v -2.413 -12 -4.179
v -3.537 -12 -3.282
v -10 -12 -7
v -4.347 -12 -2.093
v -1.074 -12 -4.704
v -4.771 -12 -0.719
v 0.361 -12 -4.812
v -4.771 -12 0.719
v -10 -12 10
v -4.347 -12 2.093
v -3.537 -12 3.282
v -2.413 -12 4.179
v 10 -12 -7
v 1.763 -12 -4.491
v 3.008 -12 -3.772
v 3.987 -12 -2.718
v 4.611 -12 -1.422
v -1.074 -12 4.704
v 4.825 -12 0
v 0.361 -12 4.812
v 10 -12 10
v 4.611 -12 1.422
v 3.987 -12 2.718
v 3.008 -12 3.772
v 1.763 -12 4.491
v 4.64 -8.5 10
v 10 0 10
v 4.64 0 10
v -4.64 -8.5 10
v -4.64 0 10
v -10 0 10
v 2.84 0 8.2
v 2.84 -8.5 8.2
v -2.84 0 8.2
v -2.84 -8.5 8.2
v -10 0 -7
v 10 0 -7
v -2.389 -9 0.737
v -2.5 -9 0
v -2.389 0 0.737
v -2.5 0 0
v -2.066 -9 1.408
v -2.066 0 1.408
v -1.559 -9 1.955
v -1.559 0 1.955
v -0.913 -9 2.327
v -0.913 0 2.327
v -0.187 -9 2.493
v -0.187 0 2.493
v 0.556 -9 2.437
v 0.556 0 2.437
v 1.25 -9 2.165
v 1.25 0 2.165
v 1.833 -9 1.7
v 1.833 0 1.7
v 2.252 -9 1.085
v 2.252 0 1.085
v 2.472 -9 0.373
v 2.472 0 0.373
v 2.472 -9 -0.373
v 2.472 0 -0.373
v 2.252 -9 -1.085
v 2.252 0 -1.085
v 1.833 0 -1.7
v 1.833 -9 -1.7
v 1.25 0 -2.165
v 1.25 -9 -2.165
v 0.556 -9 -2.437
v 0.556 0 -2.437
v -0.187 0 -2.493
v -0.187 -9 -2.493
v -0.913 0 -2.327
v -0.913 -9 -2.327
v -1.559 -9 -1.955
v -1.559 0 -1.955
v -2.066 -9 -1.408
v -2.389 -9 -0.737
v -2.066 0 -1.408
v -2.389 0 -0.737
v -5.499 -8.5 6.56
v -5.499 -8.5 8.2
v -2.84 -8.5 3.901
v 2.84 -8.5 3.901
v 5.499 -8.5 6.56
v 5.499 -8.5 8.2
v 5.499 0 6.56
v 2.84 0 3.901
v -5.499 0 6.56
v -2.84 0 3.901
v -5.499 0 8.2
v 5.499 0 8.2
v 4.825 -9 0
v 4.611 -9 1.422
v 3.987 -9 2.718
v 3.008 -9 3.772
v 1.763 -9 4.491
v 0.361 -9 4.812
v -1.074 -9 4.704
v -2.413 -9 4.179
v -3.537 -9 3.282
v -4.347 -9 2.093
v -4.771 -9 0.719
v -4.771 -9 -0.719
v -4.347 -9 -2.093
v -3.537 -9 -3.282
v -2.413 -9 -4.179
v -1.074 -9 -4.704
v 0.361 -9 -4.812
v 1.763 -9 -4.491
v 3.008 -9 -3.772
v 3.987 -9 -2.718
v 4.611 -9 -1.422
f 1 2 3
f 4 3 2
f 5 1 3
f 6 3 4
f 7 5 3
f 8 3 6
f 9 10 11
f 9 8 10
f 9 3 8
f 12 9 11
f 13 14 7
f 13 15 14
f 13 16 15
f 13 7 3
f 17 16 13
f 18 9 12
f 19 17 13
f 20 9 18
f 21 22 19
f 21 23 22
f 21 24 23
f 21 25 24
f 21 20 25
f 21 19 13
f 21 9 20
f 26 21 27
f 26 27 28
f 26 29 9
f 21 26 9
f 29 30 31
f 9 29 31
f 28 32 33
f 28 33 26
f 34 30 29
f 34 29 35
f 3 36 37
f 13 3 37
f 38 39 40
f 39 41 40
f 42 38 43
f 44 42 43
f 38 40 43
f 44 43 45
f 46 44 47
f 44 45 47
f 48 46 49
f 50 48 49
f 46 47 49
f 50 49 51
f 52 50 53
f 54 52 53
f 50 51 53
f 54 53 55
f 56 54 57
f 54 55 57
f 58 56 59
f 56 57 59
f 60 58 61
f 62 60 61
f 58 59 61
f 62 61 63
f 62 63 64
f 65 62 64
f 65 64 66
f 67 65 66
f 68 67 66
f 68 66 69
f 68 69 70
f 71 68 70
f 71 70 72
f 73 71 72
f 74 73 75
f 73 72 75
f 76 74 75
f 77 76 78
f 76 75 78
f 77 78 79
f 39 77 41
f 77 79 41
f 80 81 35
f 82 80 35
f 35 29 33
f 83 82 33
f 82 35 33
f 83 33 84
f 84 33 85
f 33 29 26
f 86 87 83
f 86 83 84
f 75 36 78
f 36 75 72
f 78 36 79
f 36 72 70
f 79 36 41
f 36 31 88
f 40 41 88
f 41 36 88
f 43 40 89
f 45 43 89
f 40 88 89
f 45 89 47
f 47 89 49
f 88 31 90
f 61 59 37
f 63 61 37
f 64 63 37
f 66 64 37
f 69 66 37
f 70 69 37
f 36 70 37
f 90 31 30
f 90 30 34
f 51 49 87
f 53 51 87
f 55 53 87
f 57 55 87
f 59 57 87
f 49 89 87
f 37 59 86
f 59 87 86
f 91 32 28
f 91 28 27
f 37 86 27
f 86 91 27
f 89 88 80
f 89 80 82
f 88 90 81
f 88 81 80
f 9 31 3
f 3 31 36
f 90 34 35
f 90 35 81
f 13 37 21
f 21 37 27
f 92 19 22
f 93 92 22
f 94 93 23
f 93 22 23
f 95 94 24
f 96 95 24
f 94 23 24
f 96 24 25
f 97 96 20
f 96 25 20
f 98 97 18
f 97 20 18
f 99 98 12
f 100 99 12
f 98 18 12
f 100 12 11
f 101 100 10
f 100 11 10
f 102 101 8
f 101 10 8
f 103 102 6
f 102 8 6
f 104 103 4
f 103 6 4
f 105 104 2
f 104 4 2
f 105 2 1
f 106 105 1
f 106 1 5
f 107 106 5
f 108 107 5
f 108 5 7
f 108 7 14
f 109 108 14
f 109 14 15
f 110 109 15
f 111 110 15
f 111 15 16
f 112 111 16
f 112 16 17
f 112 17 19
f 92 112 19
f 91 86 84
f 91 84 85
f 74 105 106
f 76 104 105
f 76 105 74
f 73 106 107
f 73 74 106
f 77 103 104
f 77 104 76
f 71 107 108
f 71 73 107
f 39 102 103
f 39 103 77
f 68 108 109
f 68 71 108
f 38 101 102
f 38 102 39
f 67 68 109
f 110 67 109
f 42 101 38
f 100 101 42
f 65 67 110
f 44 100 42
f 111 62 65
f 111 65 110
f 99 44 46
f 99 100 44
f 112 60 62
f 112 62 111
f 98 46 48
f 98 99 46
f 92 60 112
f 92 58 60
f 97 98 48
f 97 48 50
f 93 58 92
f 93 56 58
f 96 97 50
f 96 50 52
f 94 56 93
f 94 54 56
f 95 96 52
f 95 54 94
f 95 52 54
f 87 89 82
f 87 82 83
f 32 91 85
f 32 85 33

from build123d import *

# Parameters (mm, degrees)
F1_DEPTH       = 12
F2_DEPTH       = 8.5
F4_D           = 5
F4_CBORE_D     = 9.65
F4_CBORE_DEPTH = 3


with BuildPart() as f1:
    # F0 (on Front) → F1 (new body)
    with BuildSketch(Plane.XZ):
        Polygon((-10, 10), (-10, -7), (10, -7), (10, 10), (4.64, 10), (2.84, 8.2), (5.49934, 8.2), (5.49934, 6.56), (2.84, 3.90066), (-2.84, 3.90066), (-5.49934, 6.56), (-5.49934, 8.2), (-2.84, 8.2), (-4.64, 10), align=None)
        Polygon((4.64, 10), (-4.64, 10), (-2.84, 8.2), (-5.49934, 8.2), (-5.49934, 6.56), (-2.84, 3.90066), (2.84, 3.90066), (5.49934, 6.56), (5.49934, 8.2), (2.84, 8.2), align=None)
    extrude(amount=F1_DEPTH)

    # F0 (on Front) → F2 (cut)
    with BuildSketch(Plane.XZ):
        Polygon((4.64, 10), (-4.64, 10), (-2.84, 8.2), (-5.49934, 8.2), (-5.49934, 6.56), (-2.84, 3.90066), (2.84, 3.90066), (5.49934, 6.56), (5.49934, 8.2), (2.84, 8.2), align=None)
    extrude(amount=F2_DEPTH, mode=Mode.SUBTRACT)

    # F4 (through all)
    with Locations(Plane.XZ.offset(12)):
        with Locations((0, 0)):
            CounterBoreHole(F4_D / 2, F4_CBORE_D / 2, F4_CBORE_DEPTH)


solid = f1.part
